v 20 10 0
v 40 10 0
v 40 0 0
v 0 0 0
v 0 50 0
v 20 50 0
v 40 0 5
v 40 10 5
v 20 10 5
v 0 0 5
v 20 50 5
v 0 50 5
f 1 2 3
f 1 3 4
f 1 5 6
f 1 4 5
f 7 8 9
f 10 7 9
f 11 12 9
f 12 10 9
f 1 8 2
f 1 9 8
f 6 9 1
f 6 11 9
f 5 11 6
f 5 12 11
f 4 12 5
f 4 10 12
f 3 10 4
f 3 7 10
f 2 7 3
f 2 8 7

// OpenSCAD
// file: Parameters.scad
/* Frame and Hardware Parameters */
bracketThickness = 5;
extrusionThickness = 15;
narrowScrewHoleSpacing = 15;
wideScrewHoleSpacing = 30;
screwHoleDiam = 4;

/* Design Parameters */
XYSpacing = 15;

/* Gear Parameters */
gearDiam = 50;


/* 608 Bearing Mount Parameters */
bearingHolderWallThickness = 3;
bearingHolderWallHeight = 4;
bearingRadius = 11;

/* top bracket parameters */
gearSpacing = 10; // spacing between gear and extrusion
exteriorSpace = 10; // spacing beyond the bearing mount

/* lower bracket parameters */
footHeight = 10;
footDimension = bracketThickness + extrusionThickness;
bracketInnerDimension = 30;



$fs = .5;
$fa = 3;
// main file
include <Parameters.scad>;
module LShape(x, y, height=bracketThickness, wx=extrusionThickness, wy=extrusionThickness) {
	linear_extrude(height=height) polygon(points=[[0,0],[x,0],[x,wx],[wy,wx],[wy,y],[0,y]]);
}

LShape(40,50,5,10,20);
